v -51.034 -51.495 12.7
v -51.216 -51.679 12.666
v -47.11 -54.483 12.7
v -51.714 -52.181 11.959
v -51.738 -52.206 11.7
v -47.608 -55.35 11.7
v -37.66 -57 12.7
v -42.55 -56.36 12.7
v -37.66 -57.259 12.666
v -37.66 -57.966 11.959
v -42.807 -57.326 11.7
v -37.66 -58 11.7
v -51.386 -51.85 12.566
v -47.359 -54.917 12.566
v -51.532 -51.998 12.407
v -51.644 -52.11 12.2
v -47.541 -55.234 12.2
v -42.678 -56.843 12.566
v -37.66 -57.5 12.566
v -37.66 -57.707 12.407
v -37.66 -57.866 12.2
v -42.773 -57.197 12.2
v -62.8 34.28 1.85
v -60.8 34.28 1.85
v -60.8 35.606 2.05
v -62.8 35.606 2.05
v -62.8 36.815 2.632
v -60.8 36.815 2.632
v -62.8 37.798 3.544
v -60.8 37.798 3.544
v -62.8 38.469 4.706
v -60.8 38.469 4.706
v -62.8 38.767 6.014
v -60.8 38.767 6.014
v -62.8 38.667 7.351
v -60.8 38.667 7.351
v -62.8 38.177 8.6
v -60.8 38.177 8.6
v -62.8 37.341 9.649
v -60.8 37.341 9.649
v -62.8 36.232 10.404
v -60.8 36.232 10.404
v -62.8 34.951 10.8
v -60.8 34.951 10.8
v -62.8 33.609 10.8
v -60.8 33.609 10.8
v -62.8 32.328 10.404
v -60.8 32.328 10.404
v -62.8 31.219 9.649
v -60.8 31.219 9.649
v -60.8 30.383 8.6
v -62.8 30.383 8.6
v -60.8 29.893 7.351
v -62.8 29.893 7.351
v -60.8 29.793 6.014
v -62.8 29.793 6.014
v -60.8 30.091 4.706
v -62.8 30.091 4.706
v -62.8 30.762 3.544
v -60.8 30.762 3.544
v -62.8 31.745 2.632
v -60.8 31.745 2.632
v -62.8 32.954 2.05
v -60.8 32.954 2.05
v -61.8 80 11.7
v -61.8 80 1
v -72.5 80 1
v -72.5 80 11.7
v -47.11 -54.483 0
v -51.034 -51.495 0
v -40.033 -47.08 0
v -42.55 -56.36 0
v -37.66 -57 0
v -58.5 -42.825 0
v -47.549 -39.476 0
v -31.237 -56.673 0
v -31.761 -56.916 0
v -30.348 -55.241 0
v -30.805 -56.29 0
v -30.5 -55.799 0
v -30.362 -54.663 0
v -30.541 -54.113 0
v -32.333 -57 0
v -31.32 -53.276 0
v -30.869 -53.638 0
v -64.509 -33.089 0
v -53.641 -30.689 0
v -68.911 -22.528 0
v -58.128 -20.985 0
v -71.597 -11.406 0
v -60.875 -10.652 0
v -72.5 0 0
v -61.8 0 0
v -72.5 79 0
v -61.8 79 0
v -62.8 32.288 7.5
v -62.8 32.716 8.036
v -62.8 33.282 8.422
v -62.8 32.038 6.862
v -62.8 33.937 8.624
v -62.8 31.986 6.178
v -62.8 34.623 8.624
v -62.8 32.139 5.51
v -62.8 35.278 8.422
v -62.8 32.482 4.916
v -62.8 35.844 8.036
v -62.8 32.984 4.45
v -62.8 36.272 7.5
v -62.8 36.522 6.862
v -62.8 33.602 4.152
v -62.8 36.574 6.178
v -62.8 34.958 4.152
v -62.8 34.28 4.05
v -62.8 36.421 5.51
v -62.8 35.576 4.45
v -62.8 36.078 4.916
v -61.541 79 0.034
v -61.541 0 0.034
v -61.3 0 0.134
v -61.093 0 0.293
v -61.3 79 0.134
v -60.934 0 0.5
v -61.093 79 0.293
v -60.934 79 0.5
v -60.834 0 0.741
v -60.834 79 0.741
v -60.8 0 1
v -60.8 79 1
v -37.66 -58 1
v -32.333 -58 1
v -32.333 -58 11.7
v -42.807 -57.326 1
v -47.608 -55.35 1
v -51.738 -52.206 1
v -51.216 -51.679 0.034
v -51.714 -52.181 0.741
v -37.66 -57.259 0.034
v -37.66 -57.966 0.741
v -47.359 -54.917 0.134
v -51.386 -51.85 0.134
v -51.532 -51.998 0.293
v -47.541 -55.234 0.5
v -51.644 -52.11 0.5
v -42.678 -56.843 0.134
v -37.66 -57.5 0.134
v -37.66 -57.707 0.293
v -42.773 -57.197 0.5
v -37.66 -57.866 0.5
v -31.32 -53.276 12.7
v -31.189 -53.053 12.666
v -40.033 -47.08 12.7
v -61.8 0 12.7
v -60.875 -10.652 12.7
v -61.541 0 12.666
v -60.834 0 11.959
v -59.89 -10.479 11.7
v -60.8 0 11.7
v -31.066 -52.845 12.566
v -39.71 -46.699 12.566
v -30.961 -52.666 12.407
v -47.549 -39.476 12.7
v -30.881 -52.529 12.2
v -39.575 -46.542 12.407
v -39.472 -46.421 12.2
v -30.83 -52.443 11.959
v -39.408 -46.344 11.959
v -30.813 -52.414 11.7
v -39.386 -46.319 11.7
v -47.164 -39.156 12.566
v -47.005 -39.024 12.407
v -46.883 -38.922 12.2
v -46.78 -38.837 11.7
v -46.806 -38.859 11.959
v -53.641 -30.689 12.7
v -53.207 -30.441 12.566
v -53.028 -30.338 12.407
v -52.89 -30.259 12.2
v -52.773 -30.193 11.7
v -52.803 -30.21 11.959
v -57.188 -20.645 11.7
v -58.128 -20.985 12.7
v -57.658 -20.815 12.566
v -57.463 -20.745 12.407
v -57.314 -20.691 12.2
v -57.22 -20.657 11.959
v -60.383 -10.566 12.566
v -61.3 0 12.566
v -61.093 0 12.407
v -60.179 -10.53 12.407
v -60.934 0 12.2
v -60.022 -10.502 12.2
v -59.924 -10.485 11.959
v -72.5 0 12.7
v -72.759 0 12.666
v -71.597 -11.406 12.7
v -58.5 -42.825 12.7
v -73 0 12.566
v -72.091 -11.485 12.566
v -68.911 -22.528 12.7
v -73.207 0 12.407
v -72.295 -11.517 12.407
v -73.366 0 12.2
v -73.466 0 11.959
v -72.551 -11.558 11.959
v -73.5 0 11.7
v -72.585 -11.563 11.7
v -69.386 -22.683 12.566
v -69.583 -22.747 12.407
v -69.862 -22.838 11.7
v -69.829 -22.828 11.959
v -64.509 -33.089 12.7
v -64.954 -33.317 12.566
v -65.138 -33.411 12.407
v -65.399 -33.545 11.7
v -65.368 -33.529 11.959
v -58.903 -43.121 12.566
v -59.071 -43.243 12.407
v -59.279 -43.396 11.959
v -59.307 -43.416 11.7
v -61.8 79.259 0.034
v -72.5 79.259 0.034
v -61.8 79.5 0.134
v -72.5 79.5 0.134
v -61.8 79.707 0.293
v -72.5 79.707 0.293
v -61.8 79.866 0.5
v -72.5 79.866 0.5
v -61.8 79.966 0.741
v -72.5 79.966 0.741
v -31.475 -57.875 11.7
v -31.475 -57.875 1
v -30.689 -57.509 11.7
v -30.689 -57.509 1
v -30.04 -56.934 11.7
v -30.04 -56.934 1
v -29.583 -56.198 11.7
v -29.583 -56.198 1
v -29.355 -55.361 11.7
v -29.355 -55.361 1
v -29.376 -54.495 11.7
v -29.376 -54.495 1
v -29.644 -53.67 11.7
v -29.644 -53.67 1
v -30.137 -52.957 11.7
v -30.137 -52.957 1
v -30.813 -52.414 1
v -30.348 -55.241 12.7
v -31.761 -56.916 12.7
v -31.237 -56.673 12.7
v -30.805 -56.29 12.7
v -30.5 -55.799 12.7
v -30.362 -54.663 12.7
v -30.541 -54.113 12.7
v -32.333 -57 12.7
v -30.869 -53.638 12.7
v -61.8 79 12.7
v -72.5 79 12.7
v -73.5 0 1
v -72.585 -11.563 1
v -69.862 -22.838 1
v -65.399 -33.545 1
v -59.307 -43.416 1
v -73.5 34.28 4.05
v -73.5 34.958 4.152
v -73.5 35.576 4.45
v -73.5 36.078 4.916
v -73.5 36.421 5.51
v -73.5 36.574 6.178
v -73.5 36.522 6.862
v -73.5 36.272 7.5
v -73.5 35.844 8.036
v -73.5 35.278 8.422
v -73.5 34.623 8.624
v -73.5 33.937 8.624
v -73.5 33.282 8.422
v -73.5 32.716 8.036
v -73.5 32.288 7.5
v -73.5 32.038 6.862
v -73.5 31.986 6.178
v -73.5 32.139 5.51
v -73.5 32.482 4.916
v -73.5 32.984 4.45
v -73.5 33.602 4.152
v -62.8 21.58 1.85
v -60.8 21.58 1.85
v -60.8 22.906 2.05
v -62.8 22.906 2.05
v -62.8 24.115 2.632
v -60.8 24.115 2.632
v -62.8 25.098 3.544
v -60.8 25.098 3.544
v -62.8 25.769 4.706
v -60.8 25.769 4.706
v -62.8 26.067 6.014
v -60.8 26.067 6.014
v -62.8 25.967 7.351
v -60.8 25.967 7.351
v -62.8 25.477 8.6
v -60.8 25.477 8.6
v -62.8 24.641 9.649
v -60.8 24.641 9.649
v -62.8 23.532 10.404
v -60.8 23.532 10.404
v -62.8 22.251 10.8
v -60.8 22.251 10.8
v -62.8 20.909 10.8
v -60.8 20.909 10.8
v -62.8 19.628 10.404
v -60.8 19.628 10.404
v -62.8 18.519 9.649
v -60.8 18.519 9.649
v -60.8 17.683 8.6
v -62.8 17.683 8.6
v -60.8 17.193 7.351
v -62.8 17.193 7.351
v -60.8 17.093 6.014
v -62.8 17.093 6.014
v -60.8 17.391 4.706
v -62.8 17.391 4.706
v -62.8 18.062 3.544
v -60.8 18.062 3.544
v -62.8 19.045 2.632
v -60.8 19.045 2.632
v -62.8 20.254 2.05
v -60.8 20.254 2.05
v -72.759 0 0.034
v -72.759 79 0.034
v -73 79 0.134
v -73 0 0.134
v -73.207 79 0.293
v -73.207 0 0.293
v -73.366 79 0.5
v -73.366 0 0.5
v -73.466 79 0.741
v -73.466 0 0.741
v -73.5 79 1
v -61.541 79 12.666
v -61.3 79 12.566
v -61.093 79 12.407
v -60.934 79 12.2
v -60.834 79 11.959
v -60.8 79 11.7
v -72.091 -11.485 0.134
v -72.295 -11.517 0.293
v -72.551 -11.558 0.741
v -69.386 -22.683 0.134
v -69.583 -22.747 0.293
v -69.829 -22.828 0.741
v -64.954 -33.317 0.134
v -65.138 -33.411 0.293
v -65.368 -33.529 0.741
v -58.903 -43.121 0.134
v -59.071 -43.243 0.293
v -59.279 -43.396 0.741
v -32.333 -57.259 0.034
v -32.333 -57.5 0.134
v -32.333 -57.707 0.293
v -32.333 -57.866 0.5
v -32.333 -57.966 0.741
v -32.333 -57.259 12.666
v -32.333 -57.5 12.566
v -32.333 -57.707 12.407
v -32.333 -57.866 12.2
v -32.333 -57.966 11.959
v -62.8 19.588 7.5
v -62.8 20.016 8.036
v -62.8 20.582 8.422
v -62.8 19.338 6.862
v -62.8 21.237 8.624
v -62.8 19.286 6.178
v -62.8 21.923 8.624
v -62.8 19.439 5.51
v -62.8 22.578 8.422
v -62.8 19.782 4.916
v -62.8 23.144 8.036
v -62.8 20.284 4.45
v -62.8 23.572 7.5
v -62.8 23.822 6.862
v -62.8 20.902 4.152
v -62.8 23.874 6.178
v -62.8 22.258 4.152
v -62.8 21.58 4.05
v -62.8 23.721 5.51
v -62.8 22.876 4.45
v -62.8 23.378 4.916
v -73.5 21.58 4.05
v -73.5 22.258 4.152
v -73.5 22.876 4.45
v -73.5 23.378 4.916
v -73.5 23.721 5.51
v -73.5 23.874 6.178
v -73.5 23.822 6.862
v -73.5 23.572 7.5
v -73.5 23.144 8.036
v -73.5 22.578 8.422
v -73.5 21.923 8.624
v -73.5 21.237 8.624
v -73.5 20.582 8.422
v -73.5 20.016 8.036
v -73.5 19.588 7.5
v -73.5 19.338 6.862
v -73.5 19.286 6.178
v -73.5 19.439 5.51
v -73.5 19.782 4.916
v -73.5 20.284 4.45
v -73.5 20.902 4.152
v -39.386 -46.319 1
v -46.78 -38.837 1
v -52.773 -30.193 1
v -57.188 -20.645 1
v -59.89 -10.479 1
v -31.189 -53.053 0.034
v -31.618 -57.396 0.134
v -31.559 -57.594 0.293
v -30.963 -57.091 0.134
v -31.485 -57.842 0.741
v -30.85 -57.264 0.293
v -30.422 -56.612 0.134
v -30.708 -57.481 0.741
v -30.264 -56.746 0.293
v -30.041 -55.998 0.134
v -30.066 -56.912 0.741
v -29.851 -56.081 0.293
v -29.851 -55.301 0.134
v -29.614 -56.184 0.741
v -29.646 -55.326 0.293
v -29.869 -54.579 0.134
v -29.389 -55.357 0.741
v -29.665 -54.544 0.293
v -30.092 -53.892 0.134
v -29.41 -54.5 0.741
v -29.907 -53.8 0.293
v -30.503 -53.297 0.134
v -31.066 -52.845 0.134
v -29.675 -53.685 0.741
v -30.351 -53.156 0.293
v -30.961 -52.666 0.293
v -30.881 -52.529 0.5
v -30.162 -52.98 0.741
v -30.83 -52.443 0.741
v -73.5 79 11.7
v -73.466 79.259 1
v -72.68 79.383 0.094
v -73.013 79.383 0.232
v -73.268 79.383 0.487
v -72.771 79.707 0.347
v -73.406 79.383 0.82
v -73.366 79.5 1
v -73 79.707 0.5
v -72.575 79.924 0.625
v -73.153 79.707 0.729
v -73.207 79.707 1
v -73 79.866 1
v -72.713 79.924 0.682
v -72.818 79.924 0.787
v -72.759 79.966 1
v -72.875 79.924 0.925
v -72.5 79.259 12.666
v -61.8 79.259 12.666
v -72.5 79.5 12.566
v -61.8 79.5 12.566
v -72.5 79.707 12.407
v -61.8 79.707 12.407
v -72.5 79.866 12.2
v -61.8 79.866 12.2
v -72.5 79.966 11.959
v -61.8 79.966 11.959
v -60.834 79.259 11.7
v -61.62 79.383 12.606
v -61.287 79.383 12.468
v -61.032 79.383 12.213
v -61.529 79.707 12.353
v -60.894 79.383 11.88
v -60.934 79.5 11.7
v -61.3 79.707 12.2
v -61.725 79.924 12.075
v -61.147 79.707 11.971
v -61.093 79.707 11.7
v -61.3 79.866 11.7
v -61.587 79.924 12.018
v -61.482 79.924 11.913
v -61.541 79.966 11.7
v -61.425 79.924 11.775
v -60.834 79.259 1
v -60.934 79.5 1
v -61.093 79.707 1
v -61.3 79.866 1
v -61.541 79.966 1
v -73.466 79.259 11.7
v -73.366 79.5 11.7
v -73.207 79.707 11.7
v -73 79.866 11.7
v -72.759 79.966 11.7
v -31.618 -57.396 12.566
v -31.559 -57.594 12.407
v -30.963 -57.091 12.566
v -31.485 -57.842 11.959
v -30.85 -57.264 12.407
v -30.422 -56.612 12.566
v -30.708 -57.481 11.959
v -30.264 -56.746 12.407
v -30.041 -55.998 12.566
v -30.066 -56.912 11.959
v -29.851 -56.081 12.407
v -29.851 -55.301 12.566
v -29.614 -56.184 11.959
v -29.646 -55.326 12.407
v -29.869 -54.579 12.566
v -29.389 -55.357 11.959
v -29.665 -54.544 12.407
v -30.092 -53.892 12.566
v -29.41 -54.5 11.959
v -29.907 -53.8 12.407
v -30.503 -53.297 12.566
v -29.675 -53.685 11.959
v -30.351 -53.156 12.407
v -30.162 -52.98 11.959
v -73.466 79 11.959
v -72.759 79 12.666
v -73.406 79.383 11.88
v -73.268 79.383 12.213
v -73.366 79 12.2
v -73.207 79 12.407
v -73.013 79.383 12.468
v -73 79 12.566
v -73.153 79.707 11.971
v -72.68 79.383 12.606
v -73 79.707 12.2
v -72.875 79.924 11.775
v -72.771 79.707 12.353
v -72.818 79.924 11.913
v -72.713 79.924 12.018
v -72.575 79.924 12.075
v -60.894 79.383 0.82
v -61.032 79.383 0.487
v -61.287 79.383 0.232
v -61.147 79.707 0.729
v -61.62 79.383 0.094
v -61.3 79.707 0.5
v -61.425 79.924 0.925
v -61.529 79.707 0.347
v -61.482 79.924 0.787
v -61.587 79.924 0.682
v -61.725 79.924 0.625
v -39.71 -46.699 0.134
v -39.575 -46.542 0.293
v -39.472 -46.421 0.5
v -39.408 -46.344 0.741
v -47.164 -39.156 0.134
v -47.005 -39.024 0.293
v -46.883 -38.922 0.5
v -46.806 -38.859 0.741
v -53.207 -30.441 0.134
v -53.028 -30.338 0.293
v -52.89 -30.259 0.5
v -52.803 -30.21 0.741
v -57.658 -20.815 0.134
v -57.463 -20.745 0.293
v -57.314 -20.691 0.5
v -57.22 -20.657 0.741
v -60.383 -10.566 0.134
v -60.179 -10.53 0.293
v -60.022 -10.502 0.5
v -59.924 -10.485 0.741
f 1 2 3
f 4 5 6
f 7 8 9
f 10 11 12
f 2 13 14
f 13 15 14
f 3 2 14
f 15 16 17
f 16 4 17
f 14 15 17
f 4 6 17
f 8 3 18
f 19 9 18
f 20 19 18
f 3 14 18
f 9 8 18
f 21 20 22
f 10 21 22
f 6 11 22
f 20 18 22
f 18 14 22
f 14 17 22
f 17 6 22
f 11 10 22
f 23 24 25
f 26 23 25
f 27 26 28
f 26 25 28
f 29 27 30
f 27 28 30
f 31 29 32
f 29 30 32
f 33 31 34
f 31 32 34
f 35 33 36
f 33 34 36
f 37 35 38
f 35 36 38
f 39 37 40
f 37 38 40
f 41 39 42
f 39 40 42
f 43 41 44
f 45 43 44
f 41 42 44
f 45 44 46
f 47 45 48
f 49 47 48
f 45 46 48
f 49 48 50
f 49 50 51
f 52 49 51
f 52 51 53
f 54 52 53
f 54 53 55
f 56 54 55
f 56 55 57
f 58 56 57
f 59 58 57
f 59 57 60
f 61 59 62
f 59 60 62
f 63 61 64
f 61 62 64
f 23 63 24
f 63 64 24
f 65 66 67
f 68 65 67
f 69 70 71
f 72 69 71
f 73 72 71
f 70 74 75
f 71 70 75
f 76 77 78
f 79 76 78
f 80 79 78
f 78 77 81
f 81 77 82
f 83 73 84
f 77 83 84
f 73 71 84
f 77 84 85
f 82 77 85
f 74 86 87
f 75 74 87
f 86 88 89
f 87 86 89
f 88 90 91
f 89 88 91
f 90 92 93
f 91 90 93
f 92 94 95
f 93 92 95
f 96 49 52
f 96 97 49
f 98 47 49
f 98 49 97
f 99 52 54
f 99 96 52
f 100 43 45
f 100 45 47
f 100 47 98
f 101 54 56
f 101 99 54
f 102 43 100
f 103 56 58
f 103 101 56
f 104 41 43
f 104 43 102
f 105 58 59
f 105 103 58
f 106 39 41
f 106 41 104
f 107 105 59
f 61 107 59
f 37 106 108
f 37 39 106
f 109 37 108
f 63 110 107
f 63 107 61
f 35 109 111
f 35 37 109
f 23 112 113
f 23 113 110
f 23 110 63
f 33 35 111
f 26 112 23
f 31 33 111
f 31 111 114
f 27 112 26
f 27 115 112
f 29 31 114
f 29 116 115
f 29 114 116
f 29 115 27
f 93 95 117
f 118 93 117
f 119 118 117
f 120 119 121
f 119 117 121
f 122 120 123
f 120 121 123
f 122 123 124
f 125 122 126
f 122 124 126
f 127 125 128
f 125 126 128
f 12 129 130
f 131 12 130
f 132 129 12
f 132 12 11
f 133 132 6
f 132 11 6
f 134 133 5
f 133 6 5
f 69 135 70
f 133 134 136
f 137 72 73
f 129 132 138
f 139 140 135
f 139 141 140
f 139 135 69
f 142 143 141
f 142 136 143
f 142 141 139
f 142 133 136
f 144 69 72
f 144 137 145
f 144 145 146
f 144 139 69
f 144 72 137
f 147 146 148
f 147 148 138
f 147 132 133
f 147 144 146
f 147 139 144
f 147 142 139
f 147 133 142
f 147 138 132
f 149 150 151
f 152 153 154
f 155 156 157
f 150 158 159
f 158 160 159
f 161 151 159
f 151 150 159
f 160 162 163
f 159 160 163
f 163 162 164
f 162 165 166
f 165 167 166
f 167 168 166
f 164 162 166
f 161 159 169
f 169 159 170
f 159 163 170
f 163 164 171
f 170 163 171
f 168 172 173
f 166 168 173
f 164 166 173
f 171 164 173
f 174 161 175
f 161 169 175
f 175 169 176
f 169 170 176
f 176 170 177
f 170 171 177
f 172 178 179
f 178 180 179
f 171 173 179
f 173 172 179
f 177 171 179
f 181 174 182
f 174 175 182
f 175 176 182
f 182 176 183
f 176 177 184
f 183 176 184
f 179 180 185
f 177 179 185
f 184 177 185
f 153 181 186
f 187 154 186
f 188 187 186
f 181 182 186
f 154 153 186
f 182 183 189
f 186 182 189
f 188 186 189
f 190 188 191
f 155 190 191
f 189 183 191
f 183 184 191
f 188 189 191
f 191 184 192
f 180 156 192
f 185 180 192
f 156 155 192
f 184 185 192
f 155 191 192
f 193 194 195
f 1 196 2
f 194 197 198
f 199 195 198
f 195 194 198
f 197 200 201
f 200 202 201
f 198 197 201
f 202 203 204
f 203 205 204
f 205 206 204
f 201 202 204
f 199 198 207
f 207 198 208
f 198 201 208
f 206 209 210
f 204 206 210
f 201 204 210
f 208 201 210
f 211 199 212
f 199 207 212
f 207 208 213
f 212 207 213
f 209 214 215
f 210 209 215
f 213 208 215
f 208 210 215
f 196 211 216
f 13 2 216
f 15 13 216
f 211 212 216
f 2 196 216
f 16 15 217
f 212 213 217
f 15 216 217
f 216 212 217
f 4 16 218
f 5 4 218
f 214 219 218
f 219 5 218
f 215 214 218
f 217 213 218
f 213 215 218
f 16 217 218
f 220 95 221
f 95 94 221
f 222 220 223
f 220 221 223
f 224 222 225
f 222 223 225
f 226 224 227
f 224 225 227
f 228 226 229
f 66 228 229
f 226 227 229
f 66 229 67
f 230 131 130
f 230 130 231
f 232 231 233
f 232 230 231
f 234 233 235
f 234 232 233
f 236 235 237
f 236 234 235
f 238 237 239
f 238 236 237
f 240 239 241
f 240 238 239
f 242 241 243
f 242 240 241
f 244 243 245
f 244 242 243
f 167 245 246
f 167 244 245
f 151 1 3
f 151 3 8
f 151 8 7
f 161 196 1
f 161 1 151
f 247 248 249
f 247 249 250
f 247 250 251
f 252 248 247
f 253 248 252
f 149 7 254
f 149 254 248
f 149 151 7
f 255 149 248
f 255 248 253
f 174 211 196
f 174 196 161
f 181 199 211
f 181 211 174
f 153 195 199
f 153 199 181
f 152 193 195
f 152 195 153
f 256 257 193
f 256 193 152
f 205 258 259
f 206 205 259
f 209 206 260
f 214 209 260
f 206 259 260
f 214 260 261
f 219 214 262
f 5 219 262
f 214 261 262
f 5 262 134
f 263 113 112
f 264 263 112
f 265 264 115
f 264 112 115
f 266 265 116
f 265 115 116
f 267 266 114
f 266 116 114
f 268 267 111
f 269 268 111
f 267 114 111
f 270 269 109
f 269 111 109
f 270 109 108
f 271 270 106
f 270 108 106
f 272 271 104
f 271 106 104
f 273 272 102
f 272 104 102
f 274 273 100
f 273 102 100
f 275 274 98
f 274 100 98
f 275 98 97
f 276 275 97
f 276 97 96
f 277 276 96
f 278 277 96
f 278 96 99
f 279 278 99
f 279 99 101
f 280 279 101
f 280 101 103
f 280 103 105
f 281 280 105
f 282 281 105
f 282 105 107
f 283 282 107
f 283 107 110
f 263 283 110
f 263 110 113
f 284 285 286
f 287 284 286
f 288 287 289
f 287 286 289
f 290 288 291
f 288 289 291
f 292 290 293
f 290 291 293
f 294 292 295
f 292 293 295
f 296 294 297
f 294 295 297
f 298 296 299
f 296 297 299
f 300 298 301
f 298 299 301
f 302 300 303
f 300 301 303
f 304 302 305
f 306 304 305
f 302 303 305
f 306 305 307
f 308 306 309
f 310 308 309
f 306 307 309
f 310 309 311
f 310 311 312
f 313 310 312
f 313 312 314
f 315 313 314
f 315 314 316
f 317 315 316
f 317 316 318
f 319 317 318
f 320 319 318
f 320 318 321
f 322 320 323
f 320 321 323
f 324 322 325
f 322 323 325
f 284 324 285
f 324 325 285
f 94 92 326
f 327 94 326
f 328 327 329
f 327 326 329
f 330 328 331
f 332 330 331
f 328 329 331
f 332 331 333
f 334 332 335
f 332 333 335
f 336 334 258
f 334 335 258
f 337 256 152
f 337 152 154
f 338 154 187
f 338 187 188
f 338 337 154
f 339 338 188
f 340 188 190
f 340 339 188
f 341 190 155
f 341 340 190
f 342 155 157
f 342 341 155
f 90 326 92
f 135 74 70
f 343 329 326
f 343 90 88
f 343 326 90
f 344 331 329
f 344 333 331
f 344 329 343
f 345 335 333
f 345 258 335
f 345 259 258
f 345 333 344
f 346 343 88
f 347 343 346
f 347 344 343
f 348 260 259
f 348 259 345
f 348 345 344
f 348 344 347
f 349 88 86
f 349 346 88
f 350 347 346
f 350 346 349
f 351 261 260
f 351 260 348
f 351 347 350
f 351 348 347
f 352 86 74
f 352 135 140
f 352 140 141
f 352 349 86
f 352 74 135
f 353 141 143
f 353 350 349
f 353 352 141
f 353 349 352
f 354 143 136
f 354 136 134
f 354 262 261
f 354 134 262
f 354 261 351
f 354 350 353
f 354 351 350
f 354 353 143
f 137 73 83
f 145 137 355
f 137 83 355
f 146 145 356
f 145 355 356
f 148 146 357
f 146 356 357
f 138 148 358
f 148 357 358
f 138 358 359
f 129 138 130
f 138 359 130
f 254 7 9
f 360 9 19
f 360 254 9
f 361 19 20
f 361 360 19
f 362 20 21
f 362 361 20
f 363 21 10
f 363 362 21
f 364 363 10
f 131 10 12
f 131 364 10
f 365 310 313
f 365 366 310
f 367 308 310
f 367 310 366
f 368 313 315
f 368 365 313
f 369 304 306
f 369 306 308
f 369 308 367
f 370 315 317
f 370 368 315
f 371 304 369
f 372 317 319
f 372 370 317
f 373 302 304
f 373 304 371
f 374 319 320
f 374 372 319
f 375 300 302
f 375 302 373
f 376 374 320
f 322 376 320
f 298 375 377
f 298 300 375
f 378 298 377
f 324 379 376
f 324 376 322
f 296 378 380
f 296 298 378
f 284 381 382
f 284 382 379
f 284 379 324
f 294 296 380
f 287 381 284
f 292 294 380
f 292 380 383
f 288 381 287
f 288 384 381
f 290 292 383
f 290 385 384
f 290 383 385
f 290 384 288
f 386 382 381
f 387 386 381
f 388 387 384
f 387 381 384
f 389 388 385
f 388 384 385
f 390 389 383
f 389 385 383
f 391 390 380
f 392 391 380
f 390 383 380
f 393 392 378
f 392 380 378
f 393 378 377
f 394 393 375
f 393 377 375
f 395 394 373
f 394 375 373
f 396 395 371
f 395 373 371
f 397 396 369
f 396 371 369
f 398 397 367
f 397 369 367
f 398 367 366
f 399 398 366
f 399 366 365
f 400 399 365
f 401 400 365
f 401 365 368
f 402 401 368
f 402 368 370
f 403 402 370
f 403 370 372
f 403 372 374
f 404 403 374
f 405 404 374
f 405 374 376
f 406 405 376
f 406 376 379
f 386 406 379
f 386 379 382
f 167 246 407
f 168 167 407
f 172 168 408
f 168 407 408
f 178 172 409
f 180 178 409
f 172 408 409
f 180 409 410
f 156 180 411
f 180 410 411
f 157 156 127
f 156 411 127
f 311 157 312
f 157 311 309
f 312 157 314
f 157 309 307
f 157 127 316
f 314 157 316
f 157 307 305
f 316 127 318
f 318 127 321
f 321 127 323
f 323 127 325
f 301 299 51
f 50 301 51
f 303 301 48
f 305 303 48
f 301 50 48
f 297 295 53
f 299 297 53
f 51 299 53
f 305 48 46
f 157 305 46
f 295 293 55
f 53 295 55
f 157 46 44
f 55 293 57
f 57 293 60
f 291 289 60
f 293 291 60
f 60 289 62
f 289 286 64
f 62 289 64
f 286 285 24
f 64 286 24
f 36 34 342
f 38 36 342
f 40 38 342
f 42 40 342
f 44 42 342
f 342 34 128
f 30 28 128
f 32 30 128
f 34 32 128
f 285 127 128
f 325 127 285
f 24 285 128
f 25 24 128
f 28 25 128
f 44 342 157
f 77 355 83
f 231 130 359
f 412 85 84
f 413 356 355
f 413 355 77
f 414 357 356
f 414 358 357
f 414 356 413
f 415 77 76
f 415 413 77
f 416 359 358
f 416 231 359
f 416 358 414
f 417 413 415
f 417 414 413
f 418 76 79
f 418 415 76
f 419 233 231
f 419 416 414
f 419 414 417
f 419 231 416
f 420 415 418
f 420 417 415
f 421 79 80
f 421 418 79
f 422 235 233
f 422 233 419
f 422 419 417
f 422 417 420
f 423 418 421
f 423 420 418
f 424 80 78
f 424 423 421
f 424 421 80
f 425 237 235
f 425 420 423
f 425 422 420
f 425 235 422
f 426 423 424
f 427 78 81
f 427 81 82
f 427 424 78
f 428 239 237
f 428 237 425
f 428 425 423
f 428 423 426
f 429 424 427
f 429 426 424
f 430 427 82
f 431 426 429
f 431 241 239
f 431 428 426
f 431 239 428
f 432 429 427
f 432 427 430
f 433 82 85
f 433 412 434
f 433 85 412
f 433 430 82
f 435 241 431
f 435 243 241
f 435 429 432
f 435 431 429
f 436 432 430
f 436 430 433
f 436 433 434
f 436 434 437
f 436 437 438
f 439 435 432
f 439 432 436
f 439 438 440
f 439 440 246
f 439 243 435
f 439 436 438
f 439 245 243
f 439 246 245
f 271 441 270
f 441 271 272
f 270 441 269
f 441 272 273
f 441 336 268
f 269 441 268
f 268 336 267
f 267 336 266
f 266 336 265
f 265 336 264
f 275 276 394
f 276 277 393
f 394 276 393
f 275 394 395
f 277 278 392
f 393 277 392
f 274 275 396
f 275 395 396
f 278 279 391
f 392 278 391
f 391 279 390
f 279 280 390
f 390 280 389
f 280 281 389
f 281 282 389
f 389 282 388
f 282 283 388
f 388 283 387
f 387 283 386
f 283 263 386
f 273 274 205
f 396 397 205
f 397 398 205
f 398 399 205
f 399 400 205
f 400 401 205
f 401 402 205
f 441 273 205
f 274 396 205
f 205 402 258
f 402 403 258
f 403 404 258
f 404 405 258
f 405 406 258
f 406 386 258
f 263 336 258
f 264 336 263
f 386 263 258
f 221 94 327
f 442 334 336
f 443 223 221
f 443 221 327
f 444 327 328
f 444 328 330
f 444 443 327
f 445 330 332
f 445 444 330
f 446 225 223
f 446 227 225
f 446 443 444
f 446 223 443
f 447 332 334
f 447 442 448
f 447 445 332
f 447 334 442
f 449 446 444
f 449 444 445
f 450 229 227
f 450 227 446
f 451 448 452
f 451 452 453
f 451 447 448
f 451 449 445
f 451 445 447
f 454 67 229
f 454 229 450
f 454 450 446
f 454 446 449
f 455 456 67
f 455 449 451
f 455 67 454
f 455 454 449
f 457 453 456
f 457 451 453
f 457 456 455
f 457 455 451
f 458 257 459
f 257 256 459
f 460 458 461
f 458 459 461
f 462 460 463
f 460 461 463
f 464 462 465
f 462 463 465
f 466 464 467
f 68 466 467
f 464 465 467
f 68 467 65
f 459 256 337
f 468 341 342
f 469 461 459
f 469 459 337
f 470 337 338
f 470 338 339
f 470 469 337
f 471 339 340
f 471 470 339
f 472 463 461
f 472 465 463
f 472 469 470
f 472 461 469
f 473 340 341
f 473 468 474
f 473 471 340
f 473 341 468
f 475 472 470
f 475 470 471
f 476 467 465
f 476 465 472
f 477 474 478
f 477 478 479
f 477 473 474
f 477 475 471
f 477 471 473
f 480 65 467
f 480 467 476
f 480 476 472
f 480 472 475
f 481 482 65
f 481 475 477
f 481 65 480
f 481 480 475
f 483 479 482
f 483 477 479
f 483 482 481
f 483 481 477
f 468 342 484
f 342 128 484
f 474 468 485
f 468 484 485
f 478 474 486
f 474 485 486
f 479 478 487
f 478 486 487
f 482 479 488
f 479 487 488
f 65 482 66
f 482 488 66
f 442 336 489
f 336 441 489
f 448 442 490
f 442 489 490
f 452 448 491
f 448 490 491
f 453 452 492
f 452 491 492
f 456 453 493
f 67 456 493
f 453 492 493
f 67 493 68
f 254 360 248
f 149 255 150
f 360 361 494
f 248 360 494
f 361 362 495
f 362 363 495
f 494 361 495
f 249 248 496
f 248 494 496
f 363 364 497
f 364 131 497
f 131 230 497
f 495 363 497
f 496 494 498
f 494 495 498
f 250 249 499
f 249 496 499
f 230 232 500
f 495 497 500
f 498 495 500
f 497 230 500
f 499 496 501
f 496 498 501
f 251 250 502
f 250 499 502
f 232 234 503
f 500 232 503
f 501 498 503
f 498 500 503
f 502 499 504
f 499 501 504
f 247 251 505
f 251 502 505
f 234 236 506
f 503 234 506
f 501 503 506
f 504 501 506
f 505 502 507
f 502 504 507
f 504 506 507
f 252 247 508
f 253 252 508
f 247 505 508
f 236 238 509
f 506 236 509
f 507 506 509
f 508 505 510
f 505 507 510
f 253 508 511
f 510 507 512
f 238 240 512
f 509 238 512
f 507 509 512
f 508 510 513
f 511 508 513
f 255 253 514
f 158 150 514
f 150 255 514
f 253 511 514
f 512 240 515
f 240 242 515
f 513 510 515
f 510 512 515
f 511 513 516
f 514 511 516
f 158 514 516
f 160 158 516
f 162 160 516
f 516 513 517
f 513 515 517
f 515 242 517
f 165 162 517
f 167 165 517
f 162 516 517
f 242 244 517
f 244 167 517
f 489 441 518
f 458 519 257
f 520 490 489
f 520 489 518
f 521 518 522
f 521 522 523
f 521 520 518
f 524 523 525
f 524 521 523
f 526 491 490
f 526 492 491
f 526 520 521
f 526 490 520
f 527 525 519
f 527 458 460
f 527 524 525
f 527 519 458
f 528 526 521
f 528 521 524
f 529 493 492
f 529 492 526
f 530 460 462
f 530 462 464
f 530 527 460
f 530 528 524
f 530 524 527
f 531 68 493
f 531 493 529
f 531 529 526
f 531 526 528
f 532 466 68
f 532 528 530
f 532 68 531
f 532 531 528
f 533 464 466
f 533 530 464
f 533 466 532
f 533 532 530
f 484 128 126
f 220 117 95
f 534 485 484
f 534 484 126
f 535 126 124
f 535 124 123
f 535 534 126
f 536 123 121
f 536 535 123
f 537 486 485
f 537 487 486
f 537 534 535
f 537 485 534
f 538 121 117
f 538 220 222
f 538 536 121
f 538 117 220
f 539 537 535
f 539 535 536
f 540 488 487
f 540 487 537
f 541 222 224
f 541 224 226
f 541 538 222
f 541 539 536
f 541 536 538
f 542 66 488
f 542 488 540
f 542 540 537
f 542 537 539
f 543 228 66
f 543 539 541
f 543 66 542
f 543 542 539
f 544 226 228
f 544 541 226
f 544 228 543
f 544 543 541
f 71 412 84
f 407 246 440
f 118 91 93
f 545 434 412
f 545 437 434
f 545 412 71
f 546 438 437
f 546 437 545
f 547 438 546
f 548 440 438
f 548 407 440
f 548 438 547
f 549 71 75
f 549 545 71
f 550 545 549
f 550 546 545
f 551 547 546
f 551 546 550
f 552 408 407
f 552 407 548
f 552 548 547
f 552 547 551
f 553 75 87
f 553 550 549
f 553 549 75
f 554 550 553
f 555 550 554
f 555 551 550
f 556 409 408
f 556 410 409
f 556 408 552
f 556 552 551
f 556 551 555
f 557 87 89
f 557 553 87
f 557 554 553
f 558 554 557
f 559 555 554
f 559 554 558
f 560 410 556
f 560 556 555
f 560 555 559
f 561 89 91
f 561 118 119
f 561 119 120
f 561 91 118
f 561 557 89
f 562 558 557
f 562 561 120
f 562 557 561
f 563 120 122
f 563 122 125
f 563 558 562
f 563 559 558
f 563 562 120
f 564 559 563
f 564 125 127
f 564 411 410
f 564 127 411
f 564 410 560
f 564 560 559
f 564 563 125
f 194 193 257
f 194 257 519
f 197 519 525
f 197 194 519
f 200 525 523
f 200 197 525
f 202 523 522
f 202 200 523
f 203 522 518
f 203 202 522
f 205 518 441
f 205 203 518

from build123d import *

# Parameters (mm, degrees)
BOSS_EXTRUDE1_DEPTH = 12.7
FILLET1_R           = 3
FILLET2_R           = 20
CUT_EXTRUDE1_REACH  = 88.899
SKETCH2_R           = 2.3
SKETCH2_3_R         = 4.5
SKETCH2_3_R_2       = 2.3
CUT_EXTRUDE2_DEPTH  = 2
FILLET3_R           = 1
FILLET4_R           = 1


with BuildPart() as part:
    # Sketch1 → Boss-Extrude1 (new body)
    with BuildSketch(Plane.XY):
        with BuildLine():
            Line((-60.8, 0), (-60.8, 80))
            Line((-60.8, 80), (-73.5, 80))
            Line((-73.5, 80), (-73.5, 0))
            ThreePointArc((-73.5, 0), (-66.0323905, -32.279612836), (-45.14698218, -58))
            Line((-45.14698218, -58), (-18.238420984, -58))
            ThreePointArc((-18.238420984, -58), (-49.018037475, -35.970432331), (-60.8, 0))
        make_face()
    extrude(amount=BOSS_EXTRUDE1_DEPTH)

    # Fillet1
    fillet1_edges = [part.edges().sort_by_distance(p)[0] for p in [
        (-18.238420984, -58, 6.35),
    ]]
    fillet(fillet1_edges, radius=FILLET1_R)

    # Fillet2
    fillet2_edges = [part.edges().sort_by_distance(p)[0] for p in [
        (-45.14698218, -58, 6.35),
    ]]
    fillet(fillet2_edges, radius=FILLET2_R)

    # Sketch2 → Cut-Extrude1 (cut, up to next)
    with BuildSketch(Plane(origin=(-60.8, 0, 0), x_dir=(0, 0, -1), z_dir=(1, 0, 0)), mode=Mode.PRIVATE) as cut_extrude1_sk1:
        with Locations((-6.35, 21.58)):
            Circle(SKETCH2_R)
    cut_extrude1_tool1 = extrude(cut_extrude1_sk1.sketch, amount=-CUT_EXTRUDE1_REACH, mode=Mode.PRIVATE) & part.part
    # Sketch2 → Cut-Extrude1 (cut, up to next)
    with BuildSketch(Plane(origin=(-60.8, 0, 0), x_dir=(0, 0, -1), z_dir=(1, 0, 0)), mode=Mode.PRIVATE) as cut_extrude1_sk2:
        with Locations((-6.35, 34.28)):
            Circle(SKETCH2_R)
    cut_extrude1_tool2 = extrude(cut_extrude1_sk2.sketch, amount=-CUT_EXTRUDE1_REACH, mode=Mode.PRIVATE) & part.part
    add(cut_extrude1_tool1.solids().sort_by_distance((-60.8, 21.58, 6.35))[0], mode=Mode.SUBTRACT)
    add(cut_extrude1_tool2.solids().sort_by_distance((-60.8, 34.28, 6.35))[0], mode=Mode.SUBTRACT)

    # Sketch2<3> → Cut-Extrude2 (cut)
    # profile 1 of 2: a face of its own
    with BuildSketch(Plane(origin=(-60.8, 0, 0), x_dir=(0, 0, -1), z_dir=(1, 0, 0))):
        with Locations((-6.35, 34.28)):
            Circle(SKETCH2_3_R)
        with Locations((-6.35, 34.28)):
            Circle(SKETCH2_3_R_2, mode=Mode.SUBTRACT)
    # profile 2 of 2: a face of its own
    with BuildSketch(Plane(origin=(-60.8, 0, 0), x_dir=(0, 0, -1), z_dir=(1, 0, 0))):
        with Locations((-6.35, 21.58)):
            Circle(SKETCH2_3_R)
        with Locations((-6.35, 21.58)):
            Circle(SKETCH2_3_R_2, mode=Mode.SUBTRACT)
    extrude(amount=-CUT_EXTRUDE2_DEPTH, mode=Mode.SUBTRACT)

    # Fillet3
    fillet3_edges = [part.edges().sort_by_distance(p)[0] for p in [
        (-73.5, 40, 0),
        (-67.841711996, -28.279888852, 0),
        (-45.271750842, -56.494758035, 0),
        (-34.99646236, -58, 0),
        (-29.438560761, -55.787838597, 0),
        (-52.773401506, -30.192848383, 0),
        (-73.5, 40, 12.7),
        (-67.841711996, -28.279888852, 12.7),
        (-45.271750842, -56.494758035, 12.7),
        (-34.99646236, -58, 12.7),
        (-29.438560761, -55.787838597, 12.7),
        (-52.773401506, -30.192848383, 12.7),
        (-60.8, 40, 0),
        (-60.8, 40, 12.7),
    ]]
    fillet(fillet3_edges, radius=FILLET3_R)

    # Fillet4
    fillet4_edges = [part.edges().sort_by_distance(p)[0] for p in [
        (-61.092893219, 80, 12.407106781),
        (-60.8, 80, 6.35),
        (-61.092893219, 80, 0.292893219),
        (-67.15, 80, 0),
        (-73.207106781, 80, 0.292893219),
        (-73.5, 80, 6.35),
        (-73.207106781, 80, 12.407106781),
        (-67.15, 80, 12.7),
    ]]
    fillet(fillet4_edges, radius=FILLET4_R)


solid = part.part
